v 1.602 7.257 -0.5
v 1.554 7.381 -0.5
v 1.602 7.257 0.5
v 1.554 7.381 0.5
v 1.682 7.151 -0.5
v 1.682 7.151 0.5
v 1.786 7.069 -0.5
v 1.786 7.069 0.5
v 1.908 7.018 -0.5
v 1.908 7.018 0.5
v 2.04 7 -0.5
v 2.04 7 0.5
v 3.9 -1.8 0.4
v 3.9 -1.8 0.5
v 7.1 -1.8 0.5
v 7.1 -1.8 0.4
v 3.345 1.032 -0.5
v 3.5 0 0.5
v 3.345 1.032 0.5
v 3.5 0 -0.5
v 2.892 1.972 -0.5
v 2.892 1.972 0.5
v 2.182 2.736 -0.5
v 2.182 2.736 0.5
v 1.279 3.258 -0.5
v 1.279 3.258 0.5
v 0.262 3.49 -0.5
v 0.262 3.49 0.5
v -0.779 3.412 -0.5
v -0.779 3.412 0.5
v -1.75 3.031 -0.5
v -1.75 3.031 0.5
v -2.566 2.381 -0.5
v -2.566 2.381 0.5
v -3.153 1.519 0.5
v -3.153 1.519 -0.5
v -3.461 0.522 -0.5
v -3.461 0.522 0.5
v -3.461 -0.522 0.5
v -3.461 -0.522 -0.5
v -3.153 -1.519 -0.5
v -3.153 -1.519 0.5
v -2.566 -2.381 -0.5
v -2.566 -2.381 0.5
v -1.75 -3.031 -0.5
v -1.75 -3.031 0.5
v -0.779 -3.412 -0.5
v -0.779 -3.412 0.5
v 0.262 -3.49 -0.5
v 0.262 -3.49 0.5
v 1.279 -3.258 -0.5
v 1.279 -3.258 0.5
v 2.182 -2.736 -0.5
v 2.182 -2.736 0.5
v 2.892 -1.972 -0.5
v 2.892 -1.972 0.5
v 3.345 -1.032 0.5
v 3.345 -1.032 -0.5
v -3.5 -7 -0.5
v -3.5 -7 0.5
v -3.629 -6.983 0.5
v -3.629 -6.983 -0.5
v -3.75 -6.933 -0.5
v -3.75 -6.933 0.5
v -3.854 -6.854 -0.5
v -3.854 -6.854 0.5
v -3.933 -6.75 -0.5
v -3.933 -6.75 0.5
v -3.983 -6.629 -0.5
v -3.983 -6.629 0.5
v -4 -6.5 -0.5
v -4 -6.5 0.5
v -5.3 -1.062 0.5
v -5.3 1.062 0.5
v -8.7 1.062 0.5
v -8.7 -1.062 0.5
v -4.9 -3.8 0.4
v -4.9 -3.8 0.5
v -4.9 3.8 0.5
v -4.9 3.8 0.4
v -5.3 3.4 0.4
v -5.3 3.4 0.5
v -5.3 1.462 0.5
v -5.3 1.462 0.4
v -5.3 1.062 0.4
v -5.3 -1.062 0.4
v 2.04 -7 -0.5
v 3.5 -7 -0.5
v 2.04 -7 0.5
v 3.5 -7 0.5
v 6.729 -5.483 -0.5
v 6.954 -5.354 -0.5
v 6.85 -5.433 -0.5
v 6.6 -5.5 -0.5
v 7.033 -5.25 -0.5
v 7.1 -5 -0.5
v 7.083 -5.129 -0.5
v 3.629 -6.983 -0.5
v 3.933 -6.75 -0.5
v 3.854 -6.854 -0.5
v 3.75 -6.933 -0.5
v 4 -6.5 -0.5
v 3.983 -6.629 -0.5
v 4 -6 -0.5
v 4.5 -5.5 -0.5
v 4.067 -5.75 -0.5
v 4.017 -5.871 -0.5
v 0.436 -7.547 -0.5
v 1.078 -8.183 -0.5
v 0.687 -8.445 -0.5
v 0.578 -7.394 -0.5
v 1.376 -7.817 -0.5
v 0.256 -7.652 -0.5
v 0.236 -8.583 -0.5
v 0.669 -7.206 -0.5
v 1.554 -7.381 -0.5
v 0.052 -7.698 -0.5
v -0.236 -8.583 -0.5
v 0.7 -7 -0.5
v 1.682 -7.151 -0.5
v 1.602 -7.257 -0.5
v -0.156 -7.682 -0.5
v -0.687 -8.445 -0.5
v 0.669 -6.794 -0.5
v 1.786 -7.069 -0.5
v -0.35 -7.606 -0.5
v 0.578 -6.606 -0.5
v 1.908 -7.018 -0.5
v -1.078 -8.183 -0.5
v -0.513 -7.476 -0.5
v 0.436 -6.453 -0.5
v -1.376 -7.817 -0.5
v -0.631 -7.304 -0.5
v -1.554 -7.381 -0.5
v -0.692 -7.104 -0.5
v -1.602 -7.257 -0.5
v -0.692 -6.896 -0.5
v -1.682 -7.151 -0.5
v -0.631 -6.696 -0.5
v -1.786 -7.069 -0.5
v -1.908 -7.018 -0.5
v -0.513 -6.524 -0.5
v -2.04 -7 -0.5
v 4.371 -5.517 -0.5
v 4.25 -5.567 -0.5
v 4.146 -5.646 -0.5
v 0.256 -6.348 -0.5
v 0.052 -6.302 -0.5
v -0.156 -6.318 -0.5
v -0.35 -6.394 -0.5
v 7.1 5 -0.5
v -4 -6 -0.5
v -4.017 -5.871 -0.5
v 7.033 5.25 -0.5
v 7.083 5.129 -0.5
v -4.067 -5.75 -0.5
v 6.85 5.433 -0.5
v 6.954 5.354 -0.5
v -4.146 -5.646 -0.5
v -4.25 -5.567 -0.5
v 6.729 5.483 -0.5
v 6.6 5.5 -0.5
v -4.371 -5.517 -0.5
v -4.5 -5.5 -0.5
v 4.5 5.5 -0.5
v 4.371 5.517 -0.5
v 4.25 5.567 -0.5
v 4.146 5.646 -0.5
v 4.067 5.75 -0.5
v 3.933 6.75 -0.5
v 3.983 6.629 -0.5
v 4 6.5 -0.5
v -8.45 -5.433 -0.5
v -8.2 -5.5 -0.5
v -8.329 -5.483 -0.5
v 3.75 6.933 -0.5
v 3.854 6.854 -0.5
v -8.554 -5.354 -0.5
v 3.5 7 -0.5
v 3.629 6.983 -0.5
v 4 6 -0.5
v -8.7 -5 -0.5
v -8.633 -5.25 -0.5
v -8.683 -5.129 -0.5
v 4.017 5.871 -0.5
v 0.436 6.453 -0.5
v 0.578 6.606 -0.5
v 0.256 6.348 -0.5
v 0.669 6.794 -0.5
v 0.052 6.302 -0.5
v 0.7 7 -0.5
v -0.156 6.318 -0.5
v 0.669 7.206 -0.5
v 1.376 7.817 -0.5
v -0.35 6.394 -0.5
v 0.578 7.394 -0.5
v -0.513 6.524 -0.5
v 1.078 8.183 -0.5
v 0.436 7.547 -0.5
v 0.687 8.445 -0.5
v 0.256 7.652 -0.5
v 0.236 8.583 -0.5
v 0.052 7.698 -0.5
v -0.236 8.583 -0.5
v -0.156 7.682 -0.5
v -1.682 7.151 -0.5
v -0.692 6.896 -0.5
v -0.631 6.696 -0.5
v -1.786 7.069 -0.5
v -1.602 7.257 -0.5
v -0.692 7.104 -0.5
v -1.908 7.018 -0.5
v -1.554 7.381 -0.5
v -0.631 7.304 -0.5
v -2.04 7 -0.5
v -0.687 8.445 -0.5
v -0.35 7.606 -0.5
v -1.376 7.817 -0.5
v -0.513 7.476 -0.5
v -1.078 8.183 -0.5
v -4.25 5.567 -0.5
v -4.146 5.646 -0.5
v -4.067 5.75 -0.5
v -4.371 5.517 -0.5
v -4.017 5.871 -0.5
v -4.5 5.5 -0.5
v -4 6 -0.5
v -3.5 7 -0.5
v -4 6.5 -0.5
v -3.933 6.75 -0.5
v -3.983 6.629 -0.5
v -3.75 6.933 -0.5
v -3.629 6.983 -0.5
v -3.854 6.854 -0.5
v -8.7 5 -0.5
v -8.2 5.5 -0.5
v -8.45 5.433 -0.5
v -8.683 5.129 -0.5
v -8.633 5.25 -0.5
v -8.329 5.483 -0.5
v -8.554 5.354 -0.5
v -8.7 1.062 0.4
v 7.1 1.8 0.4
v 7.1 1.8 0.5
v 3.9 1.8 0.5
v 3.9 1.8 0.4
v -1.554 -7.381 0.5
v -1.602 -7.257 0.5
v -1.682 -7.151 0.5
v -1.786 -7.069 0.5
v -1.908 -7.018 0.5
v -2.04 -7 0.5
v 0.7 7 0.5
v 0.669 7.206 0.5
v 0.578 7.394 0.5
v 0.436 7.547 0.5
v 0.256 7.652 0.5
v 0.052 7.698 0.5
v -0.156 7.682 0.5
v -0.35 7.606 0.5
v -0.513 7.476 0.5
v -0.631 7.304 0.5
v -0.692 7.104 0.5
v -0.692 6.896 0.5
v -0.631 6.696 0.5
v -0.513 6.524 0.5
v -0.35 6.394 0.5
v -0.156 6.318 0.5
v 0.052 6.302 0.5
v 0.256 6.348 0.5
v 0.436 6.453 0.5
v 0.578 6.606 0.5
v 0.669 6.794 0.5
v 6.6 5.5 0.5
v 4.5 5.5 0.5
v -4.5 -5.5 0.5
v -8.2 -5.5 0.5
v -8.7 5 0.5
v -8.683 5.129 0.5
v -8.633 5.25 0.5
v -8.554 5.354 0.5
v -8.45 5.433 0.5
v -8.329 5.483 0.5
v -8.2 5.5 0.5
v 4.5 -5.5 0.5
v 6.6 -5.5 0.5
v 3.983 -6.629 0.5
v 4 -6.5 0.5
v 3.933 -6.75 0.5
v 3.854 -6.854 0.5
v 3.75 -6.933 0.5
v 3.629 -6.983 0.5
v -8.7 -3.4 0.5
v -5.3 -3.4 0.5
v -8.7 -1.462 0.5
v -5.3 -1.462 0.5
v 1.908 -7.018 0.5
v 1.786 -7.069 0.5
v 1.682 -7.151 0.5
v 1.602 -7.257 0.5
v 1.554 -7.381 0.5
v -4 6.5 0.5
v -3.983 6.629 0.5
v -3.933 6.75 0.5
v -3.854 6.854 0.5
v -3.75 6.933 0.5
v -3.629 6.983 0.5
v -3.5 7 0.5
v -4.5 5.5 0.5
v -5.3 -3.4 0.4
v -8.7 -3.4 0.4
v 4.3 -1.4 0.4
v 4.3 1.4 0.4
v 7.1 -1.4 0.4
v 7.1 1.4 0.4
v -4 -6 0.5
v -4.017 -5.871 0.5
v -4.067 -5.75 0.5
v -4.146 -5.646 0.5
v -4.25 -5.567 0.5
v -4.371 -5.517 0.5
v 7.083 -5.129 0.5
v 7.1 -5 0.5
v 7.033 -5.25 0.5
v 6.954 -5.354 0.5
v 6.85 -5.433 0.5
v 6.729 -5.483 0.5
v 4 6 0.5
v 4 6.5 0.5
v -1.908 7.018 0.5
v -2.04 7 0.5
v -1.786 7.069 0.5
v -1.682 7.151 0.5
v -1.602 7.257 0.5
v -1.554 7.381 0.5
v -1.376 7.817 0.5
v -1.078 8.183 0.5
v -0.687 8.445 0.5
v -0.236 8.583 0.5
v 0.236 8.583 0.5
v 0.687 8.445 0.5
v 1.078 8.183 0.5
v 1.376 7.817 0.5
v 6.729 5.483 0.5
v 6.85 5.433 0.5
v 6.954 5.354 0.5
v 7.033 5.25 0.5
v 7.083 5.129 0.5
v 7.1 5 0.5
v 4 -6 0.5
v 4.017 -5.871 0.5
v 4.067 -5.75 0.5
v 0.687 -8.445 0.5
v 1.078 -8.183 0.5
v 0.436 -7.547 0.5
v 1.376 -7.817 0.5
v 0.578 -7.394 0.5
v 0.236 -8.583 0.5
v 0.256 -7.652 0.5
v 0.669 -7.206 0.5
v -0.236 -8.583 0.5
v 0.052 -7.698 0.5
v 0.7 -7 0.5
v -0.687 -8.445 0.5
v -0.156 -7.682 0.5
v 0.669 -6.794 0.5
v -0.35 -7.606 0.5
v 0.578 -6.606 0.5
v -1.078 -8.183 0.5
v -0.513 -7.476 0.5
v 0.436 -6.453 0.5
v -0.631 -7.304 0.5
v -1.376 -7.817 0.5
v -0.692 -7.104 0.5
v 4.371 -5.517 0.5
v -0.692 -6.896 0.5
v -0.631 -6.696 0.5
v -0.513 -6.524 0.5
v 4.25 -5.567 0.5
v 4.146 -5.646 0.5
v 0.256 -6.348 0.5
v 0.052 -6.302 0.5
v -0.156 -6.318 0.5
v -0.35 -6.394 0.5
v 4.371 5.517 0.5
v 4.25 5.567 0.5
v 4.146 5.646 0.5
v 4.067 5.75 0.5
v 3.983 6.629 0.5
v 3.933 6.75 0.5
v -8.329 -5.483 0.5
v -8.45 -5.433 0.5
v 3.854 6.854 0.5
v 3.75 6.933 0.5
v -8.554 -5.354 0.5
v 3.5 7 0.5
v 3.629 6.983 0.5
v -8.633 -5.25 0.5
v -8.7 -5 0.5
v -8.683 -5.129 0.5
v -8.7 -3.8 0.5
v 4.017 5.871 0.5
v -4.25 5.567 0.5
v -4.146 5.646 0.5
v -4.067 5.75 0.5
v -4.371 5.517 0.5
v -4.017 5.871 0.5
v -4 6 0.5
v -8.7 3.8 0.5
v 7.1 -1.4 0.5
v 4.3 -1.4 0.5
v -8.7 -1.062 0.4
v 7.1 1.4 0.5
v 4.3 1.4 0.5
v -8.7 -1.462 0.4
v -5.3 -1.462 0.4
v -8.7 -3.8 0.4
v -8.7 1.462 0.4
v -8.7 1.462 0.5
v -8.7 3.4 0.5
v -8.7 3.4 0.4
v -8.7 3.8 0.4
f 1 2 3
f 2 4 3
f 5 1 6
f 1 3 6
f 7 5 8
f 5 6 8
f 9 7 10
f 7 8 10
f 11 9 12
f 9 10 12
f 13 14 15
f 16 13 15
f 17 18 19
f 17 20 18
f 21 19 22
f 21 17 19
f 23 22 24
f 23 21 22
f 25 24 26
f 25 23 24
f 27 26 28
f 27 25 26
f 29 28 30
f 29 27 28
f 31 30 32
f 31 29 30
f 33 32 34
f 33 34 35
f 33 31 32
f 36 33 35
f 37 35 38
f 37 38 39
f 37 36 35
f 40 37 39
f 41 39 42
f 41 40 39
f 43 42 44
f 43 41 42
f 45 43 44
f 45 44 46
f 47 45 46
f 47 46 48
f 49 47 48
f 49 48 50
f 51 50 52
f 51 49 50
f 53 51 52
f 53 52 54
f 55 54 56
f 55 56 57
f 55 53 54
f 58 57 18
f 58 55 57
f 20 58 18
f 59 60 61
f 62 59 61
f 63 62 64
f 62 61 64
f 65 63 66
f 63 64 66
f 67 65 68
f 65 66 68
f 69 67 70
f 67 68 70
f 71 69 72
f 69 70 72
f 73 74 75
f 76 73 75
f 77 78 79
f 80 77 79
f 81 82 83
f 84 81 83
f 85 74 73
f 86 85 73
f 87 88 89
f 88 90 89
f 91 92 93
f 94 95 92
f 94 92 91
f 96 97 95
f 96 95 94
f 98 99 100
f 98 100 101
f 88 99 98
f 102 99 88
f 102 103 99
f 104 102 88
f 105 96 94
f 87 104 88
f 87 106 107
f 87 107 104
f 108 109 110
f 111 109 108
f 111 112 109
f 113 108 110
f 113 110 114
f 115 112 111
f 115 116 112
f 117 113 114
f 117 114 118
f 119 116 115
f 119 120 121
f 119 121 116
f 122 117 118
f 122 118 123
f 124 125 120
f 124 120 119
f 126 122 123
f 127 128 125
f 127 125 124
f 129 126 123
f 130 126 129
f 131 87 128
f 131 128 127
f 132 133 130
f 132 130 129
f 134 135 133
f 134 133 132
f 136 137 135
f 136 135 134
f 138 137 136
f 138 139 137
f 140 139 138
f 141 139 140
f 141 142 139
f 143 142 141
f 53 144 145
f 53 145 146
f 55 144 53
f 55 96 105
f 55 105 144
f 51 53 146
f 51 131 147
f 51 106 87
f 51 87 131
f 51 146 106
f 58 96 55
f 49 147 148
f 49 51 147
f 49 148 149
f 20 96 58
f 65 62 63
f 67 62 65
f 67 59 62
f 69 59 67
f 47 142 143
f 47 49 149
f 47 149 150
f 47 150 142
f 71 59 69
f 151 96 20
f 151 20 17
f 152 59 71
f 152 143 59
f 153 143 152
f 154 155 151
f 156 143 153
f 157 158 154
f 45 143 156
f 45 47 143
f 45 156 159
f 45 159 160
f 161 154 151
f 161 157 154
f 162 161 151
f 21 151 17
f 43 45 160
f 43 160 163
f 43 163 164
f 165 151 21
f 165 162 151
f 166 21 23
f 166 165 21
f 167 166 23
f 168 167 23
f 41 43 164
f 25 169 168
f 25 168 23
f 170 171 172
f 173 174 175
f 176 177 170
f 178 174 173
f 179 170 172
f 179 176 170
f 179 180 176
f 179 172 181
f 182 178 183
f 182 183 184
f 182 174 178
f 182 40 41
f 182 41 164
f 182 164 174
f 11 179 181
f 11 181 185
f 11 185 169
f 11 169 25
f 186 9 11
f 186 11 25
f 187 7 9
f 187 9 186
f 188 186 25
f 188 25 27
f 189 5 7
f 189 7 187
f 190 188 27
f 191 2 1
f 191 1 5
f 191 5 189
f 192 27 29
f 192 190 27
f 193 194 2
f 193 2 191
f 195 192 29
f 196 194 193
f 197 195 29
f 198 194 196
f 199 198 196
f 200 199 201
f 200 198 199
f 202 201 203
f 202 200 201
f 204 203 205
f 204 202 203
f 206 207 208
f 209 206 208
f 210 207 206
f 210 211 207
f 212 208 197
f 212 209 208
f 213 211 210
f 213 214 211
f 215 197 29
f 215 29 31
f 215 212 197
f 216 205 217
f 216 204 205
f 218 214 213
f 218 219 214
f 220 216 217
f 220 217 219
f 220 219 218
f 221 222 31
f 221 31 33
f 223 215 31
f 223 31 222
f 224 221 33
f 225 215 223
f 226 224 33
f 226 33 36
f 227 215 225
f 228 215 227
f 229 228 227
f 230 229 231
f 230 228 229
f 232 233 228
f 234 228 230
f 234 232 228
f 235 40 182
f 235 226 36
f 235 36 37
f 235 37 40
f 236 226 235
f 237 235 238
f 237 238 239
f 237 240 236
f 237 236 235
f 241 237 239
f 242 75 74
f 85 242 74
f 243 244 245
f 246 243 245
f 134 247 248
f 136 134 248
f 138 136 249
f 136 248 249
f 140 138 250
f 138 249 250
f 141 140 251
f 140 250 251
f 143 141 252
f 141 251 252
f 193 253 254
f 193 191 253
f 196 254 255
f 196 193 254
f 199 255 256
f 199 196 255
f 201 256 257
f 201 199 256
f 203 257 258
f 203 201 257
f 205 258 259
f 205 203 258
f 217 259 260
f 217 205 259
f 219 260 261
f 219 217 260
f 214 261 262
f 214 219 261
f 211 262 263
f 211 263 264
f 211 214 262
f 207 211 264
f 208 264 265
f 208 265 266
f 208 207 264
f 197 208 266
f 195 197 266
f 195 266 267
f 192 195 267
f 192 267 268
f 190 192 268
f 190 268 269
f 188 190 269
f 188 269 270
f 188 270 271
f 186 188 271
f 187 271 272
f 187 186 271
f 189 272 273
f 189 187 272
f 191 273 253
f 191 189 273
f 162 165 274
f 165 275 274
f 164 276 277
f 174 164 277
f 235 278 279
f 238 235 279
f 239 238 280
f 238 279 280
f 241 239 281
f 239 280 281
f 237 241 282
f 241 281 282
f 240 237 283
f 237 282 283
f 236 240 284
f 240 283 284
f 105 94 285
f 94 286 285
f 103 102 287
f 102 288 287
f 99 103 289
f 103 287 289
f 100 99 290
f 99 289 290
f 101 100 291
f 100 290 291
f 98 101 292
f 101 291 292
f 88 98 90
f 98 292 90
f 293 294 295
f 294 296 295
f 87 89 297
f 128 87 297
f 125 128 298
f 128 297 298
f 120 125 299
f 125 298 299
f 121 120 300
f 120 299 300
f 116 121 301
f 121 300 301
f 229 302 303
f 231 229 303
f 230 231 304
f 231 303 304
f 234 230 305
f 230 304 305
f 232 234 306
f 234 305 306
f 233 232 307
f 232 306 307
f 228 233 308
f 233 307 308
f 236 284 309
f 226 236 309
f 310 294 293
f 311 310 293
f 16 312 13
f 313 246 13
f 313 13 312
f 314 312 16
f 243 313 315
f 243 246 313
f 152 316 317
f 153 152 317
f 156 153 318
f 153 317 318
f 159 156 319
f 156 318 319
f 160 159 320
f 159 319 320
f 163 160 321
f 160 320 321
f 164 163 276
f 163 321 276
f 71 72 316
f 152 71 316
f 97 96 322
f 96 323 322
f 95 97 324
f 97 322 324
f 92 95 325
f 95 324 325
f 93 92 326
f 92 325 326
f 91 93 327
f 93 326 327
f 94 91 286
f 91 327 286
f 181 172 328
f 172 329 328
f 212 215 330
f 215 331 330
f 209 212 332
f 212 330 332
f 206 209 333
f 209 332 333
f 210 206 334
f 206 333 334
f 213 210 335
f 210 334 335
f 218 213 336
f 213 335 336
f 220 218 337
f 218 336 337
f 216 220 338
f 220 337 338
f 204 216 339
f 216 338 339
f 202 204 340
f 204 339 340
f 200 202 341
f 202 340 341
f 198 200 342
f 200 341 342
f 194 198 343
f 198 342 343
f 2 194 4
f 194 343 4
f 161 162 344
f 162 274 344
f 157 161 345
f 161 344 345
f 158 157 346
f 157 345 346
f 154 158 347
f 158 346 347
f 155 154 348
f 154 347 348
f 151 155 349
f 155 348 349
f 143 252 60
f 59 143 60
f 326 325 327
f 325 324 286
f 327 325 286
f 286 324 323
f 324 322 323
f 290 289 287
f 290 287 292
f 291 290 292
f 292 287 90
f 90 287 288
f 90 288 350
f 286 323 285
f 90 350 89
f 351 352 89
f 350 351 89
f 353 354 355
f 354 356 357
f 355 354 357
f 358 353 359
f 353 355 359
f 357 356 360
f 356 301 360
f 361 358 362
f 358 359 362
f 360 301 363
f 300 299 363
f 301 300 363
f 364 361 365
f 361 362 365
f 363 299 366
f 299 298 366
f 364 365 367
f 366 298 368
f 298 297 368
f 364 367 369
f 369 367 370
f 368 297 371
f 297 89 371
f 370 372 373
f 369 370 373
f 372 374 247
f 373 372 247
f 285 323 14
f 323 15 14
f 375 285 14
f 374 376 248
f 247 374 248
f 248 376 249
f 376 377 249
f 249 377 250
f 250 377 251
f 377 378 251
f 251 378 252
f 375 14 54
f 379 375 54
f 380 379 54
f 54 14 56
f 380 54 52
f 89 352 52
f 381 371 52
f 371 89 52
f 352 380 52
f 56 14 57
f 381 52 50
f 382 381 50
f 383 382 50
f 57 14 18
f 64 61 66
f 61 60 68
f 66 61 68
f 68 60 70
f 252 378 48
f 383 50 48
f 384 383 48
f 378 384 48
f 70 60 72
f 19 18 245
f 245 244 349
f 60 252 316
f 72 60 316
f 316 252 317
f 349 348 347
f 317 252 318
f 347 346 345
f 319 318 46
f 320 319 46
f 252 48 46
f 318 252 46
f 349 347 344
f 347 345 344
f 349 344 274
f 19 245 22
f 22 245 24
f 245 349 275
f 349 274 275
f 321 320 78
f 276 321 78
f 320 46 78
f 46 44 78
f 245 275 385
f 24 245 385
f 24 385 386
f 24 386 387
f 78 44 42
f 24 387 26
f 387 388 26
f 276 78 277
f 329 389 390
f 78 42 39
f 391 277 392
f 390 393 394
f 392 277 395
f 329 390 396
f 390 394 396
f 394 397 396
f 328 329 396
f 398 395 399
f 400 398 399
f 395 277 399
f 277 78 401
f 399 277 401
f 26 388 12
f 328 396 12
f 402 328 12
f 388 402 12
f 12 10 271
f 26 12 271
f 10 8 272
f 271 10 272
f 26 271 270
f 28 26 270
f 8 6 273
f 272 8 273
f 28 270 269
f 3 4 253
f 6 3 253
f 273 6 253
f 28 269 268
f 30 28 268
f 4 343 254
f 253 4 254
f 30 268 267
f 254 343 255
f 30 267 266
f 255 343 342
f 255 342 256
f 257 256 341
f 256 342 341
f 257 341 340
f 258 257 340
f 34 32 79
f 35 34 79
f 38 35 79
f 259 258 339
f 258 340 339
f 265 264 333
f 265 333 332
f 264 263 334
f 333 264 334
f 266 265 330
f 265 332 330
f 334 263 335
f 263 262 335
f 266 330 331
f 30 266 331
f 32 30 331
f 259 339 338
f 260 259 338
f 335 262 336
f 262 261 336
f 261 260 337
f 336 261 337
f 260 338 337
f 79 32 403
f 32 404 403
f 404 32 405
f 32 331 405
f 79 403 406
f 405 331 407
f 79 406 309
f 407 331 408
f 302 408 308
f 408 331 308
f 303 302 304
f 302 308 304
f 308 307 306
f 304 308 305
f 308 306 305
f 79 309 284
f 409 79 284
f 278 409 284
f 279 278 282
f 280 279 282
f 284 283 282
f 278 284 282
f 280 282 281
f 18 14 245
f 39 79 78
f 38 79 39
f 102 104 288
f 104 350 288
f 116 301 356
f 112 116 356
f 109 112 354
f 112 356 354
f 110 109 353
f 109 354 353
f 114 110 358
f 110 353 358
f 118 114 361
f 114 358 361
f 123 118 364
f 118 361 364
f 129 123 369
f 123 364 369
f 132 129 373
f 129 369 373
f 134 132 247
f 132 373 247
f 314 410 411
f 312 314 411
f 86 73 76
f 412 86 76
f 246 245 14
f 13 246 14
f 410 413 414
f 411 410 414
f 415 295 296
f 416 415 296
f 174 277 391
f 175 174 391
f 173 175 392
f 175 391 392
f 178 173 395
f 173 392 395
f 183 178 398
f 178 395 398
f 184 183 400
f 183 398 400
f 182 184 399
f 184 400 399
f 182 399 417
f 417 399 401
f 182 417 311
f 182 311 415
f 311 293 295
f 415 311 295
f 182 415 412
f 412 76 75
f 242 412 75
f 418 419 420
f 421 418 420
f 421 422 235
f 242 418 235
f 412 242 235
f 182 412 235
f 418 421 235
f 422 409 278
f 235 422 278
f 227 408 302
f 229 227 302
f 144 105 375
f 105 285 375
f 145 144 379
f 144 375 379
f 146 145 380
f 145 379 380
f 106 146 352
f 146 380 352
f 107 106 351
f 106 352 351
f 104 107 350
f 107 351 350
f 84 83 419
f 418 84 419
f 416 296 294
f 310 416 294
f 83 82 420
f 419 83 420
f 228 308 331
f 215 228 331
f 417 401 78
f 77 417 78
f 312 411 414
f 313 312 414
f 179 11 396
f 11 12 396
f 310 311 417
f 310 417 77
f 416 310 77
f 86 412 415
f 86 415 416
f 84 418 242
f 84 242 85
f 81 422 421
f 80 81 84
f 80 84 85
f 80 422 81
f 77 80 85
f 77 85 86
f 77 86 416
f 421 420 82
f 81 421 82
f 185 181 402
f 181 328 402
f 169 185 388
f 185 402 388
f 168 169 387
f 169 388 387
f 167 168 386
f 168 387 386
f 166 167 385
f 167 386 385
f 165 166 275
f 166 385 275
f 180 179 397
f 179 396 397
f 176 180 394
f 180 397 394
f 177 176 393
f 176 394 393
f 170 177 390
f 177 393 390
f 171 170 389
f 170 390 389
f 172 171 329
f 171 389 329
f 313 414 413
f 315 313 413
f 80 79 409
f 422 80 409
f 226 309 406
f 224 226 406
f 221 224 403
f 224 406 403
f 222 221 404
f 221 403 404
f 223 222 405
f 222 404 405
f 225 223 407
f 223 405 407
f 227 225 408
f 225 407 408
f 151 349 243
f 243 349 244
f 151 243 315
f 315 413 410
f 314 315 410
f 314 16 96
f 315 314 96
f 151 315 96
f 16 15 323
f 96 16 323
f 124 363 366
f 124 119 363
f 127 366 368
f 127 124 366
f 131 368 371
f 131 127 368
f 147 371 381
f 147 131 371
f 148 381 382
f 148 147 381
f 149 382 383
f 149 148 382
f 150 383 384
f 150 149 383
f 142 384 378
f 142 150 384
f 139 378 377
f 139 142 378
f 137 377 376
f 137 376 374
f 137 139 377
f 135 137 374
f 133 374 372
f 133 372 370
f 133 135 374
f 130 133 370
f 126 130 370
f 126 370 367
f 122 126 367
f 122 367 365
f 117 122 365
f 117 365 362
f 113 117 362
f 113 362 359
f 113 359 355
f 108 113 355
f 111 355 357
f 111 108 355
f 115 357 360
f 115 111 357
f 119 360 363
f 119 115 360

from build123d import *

# Parameters (mm, degrees)
MODEL_R         = 3.5
MODEL_R_2       = 0.7
EXTRUDE_1_DEPTH = 0.5
EXTRUDE2_DEPTH  = 0.1


with BuildPart() as part:
    # Model → Бобышка-Вытянуть1 (new, symmetric)
    with BuildSketch(Plane.XY):
        with BuildLine():
            Line((-3.5, 7), (-2.039607805, 7))
            ThreePointArc((-2.039607805, 7), (-1.731001106, 7.106602104), (-1.553986899, 7.380952381))
            ThreePointArc((-1.553986899, 7.380952381), (0, 8.6), (1.553986899, 7.380952381))
            ThreePointArc((1.553986899, 7.380952381), (1.731001106, 7.106602104), (2.039607805, 7))
            Line((2.039607805, 7), (3.5, 7))
            ThreePointArc((3.5, 7), (3.853553391, 6.853553391), (4, 6.5))
            Line((4, 6.5), (4, 6))
            ThreePointArc((4, 6), (4.146446609, 5.646446609), (4.5, 5.5))
            Line((4.5, 5.5), (6.6, 5.5))
            ThreePointArc((6.6, 5.5), (6.953553391, 5.353553391), (7.1, 5))
            Line((7.1, 5), (7.1, -5))
            ThreePointArc((7.1, -5), (6.953553391, -5.353553391), (6.6, -5.5))
            Line((6.6, -5.5), (4.5, -5.5))
            ThreePointArc((4.5, -5.5), (4.146446609, -5.646446609), (4, -6))
            Line((4, -6), (4, -6.5))
            ThreePointArc((4, -6.5), (3.853553391, -6.853553391), (3.5, -7))
            Line((3.5, -7), (2.039607805, -7))
            ThreePointArc((2.039607805, -7), (1.731001106, -7.106602104), (1.553986899, -7.380952381))
            ThreePointArc((1.553986899, -7.380952381), (0, -8.6), (-1.553986899, -7.380952381))
            ThreePointArc((-1.553986899, -7.380952381), (-1.731001106, -7.106602104), (-2.039607805, -7))
            Line((-2.039607805, -7), (-3.5, -7))
            ThreePointArc((-3.5, -7), (-3.853553391, -6.853553391), (-4, -6.5))
            Line((-4, -6.5), (-4, -6))
            ThreePointArc((-4, -6), (-4.146446609, -5.646446609), (-4.5, -5.5))
            Line((-4.5, -5.5), (-8.2, -5.5))
            ThreePointArc((-8.2, -5.5), (-8.553553391, -5.353553391), (-8.7, -5))
            Line((-8.7, -5), (-8.7, 5))
            ThreePointArc((-8.7, 5), (-8.553553391, 5.353553391), (-8.2, 5.5))
            Line((-8.2, 5.5), (-4.5, 5.5))
            ThreePointArc((-4.5, 5.5), (-4.146446609, 5.646446609), (-4, 6))
            Line((-4, 6), (-4, 6.5))
            ThreePointArc((-4, 6.5), (-3.853553391, 6.853553391), (-3.5, 7))
        make_face()
        Circle(MODEL_R, mode=Mode.SUBTRACT)
        with Locations((0, 7)):
            Circle(MODEL_R_2, mode=Mode.SUBTRACT)
        with Locations((0, -7)):
            Circle(MODEL_R_2, mode=Mode.SUBTRACT)
    extrude(amount=EXTRUDE_1_DEPTH, both=True)

    # Sketch2 → Extrude2 (cut)
    with BuildSketch(Plane.XY.offset(0.5)):
        Polygon((-9.557418436, -3.8), (-4.9, -3.8), (-4.9, 3.8), (-9.557418436, 3.8), (-9.557418436, 3.4), (-5.3, 3.4), (-5.3, 1.462476295), (-9.557418436, 1.462476295), (-9.557418436, 1.062476295), (-5.3, 1.062476295), (-5.3, -1.062476295), (-9.557418436, -1.062476295), (-9.557418436, -1.462476295), (-5.3, -1.462476295), (-5.3, -3.4), (-9.557418436, -3.4), align=None)
        Polygon((7.739654587, -1.8), (7.739654587, -1.4), (4.3, -1.4), (4.3, 1.4), (7.739654587, 1.4), (7.739654587, 1.8), (3.9, 1.8), (3.9, -1.8), align=None)
    extrude(amount=-EXTRUDE2_DEPTH, mode=Mode.SUBTRACT)


solid = part.part
